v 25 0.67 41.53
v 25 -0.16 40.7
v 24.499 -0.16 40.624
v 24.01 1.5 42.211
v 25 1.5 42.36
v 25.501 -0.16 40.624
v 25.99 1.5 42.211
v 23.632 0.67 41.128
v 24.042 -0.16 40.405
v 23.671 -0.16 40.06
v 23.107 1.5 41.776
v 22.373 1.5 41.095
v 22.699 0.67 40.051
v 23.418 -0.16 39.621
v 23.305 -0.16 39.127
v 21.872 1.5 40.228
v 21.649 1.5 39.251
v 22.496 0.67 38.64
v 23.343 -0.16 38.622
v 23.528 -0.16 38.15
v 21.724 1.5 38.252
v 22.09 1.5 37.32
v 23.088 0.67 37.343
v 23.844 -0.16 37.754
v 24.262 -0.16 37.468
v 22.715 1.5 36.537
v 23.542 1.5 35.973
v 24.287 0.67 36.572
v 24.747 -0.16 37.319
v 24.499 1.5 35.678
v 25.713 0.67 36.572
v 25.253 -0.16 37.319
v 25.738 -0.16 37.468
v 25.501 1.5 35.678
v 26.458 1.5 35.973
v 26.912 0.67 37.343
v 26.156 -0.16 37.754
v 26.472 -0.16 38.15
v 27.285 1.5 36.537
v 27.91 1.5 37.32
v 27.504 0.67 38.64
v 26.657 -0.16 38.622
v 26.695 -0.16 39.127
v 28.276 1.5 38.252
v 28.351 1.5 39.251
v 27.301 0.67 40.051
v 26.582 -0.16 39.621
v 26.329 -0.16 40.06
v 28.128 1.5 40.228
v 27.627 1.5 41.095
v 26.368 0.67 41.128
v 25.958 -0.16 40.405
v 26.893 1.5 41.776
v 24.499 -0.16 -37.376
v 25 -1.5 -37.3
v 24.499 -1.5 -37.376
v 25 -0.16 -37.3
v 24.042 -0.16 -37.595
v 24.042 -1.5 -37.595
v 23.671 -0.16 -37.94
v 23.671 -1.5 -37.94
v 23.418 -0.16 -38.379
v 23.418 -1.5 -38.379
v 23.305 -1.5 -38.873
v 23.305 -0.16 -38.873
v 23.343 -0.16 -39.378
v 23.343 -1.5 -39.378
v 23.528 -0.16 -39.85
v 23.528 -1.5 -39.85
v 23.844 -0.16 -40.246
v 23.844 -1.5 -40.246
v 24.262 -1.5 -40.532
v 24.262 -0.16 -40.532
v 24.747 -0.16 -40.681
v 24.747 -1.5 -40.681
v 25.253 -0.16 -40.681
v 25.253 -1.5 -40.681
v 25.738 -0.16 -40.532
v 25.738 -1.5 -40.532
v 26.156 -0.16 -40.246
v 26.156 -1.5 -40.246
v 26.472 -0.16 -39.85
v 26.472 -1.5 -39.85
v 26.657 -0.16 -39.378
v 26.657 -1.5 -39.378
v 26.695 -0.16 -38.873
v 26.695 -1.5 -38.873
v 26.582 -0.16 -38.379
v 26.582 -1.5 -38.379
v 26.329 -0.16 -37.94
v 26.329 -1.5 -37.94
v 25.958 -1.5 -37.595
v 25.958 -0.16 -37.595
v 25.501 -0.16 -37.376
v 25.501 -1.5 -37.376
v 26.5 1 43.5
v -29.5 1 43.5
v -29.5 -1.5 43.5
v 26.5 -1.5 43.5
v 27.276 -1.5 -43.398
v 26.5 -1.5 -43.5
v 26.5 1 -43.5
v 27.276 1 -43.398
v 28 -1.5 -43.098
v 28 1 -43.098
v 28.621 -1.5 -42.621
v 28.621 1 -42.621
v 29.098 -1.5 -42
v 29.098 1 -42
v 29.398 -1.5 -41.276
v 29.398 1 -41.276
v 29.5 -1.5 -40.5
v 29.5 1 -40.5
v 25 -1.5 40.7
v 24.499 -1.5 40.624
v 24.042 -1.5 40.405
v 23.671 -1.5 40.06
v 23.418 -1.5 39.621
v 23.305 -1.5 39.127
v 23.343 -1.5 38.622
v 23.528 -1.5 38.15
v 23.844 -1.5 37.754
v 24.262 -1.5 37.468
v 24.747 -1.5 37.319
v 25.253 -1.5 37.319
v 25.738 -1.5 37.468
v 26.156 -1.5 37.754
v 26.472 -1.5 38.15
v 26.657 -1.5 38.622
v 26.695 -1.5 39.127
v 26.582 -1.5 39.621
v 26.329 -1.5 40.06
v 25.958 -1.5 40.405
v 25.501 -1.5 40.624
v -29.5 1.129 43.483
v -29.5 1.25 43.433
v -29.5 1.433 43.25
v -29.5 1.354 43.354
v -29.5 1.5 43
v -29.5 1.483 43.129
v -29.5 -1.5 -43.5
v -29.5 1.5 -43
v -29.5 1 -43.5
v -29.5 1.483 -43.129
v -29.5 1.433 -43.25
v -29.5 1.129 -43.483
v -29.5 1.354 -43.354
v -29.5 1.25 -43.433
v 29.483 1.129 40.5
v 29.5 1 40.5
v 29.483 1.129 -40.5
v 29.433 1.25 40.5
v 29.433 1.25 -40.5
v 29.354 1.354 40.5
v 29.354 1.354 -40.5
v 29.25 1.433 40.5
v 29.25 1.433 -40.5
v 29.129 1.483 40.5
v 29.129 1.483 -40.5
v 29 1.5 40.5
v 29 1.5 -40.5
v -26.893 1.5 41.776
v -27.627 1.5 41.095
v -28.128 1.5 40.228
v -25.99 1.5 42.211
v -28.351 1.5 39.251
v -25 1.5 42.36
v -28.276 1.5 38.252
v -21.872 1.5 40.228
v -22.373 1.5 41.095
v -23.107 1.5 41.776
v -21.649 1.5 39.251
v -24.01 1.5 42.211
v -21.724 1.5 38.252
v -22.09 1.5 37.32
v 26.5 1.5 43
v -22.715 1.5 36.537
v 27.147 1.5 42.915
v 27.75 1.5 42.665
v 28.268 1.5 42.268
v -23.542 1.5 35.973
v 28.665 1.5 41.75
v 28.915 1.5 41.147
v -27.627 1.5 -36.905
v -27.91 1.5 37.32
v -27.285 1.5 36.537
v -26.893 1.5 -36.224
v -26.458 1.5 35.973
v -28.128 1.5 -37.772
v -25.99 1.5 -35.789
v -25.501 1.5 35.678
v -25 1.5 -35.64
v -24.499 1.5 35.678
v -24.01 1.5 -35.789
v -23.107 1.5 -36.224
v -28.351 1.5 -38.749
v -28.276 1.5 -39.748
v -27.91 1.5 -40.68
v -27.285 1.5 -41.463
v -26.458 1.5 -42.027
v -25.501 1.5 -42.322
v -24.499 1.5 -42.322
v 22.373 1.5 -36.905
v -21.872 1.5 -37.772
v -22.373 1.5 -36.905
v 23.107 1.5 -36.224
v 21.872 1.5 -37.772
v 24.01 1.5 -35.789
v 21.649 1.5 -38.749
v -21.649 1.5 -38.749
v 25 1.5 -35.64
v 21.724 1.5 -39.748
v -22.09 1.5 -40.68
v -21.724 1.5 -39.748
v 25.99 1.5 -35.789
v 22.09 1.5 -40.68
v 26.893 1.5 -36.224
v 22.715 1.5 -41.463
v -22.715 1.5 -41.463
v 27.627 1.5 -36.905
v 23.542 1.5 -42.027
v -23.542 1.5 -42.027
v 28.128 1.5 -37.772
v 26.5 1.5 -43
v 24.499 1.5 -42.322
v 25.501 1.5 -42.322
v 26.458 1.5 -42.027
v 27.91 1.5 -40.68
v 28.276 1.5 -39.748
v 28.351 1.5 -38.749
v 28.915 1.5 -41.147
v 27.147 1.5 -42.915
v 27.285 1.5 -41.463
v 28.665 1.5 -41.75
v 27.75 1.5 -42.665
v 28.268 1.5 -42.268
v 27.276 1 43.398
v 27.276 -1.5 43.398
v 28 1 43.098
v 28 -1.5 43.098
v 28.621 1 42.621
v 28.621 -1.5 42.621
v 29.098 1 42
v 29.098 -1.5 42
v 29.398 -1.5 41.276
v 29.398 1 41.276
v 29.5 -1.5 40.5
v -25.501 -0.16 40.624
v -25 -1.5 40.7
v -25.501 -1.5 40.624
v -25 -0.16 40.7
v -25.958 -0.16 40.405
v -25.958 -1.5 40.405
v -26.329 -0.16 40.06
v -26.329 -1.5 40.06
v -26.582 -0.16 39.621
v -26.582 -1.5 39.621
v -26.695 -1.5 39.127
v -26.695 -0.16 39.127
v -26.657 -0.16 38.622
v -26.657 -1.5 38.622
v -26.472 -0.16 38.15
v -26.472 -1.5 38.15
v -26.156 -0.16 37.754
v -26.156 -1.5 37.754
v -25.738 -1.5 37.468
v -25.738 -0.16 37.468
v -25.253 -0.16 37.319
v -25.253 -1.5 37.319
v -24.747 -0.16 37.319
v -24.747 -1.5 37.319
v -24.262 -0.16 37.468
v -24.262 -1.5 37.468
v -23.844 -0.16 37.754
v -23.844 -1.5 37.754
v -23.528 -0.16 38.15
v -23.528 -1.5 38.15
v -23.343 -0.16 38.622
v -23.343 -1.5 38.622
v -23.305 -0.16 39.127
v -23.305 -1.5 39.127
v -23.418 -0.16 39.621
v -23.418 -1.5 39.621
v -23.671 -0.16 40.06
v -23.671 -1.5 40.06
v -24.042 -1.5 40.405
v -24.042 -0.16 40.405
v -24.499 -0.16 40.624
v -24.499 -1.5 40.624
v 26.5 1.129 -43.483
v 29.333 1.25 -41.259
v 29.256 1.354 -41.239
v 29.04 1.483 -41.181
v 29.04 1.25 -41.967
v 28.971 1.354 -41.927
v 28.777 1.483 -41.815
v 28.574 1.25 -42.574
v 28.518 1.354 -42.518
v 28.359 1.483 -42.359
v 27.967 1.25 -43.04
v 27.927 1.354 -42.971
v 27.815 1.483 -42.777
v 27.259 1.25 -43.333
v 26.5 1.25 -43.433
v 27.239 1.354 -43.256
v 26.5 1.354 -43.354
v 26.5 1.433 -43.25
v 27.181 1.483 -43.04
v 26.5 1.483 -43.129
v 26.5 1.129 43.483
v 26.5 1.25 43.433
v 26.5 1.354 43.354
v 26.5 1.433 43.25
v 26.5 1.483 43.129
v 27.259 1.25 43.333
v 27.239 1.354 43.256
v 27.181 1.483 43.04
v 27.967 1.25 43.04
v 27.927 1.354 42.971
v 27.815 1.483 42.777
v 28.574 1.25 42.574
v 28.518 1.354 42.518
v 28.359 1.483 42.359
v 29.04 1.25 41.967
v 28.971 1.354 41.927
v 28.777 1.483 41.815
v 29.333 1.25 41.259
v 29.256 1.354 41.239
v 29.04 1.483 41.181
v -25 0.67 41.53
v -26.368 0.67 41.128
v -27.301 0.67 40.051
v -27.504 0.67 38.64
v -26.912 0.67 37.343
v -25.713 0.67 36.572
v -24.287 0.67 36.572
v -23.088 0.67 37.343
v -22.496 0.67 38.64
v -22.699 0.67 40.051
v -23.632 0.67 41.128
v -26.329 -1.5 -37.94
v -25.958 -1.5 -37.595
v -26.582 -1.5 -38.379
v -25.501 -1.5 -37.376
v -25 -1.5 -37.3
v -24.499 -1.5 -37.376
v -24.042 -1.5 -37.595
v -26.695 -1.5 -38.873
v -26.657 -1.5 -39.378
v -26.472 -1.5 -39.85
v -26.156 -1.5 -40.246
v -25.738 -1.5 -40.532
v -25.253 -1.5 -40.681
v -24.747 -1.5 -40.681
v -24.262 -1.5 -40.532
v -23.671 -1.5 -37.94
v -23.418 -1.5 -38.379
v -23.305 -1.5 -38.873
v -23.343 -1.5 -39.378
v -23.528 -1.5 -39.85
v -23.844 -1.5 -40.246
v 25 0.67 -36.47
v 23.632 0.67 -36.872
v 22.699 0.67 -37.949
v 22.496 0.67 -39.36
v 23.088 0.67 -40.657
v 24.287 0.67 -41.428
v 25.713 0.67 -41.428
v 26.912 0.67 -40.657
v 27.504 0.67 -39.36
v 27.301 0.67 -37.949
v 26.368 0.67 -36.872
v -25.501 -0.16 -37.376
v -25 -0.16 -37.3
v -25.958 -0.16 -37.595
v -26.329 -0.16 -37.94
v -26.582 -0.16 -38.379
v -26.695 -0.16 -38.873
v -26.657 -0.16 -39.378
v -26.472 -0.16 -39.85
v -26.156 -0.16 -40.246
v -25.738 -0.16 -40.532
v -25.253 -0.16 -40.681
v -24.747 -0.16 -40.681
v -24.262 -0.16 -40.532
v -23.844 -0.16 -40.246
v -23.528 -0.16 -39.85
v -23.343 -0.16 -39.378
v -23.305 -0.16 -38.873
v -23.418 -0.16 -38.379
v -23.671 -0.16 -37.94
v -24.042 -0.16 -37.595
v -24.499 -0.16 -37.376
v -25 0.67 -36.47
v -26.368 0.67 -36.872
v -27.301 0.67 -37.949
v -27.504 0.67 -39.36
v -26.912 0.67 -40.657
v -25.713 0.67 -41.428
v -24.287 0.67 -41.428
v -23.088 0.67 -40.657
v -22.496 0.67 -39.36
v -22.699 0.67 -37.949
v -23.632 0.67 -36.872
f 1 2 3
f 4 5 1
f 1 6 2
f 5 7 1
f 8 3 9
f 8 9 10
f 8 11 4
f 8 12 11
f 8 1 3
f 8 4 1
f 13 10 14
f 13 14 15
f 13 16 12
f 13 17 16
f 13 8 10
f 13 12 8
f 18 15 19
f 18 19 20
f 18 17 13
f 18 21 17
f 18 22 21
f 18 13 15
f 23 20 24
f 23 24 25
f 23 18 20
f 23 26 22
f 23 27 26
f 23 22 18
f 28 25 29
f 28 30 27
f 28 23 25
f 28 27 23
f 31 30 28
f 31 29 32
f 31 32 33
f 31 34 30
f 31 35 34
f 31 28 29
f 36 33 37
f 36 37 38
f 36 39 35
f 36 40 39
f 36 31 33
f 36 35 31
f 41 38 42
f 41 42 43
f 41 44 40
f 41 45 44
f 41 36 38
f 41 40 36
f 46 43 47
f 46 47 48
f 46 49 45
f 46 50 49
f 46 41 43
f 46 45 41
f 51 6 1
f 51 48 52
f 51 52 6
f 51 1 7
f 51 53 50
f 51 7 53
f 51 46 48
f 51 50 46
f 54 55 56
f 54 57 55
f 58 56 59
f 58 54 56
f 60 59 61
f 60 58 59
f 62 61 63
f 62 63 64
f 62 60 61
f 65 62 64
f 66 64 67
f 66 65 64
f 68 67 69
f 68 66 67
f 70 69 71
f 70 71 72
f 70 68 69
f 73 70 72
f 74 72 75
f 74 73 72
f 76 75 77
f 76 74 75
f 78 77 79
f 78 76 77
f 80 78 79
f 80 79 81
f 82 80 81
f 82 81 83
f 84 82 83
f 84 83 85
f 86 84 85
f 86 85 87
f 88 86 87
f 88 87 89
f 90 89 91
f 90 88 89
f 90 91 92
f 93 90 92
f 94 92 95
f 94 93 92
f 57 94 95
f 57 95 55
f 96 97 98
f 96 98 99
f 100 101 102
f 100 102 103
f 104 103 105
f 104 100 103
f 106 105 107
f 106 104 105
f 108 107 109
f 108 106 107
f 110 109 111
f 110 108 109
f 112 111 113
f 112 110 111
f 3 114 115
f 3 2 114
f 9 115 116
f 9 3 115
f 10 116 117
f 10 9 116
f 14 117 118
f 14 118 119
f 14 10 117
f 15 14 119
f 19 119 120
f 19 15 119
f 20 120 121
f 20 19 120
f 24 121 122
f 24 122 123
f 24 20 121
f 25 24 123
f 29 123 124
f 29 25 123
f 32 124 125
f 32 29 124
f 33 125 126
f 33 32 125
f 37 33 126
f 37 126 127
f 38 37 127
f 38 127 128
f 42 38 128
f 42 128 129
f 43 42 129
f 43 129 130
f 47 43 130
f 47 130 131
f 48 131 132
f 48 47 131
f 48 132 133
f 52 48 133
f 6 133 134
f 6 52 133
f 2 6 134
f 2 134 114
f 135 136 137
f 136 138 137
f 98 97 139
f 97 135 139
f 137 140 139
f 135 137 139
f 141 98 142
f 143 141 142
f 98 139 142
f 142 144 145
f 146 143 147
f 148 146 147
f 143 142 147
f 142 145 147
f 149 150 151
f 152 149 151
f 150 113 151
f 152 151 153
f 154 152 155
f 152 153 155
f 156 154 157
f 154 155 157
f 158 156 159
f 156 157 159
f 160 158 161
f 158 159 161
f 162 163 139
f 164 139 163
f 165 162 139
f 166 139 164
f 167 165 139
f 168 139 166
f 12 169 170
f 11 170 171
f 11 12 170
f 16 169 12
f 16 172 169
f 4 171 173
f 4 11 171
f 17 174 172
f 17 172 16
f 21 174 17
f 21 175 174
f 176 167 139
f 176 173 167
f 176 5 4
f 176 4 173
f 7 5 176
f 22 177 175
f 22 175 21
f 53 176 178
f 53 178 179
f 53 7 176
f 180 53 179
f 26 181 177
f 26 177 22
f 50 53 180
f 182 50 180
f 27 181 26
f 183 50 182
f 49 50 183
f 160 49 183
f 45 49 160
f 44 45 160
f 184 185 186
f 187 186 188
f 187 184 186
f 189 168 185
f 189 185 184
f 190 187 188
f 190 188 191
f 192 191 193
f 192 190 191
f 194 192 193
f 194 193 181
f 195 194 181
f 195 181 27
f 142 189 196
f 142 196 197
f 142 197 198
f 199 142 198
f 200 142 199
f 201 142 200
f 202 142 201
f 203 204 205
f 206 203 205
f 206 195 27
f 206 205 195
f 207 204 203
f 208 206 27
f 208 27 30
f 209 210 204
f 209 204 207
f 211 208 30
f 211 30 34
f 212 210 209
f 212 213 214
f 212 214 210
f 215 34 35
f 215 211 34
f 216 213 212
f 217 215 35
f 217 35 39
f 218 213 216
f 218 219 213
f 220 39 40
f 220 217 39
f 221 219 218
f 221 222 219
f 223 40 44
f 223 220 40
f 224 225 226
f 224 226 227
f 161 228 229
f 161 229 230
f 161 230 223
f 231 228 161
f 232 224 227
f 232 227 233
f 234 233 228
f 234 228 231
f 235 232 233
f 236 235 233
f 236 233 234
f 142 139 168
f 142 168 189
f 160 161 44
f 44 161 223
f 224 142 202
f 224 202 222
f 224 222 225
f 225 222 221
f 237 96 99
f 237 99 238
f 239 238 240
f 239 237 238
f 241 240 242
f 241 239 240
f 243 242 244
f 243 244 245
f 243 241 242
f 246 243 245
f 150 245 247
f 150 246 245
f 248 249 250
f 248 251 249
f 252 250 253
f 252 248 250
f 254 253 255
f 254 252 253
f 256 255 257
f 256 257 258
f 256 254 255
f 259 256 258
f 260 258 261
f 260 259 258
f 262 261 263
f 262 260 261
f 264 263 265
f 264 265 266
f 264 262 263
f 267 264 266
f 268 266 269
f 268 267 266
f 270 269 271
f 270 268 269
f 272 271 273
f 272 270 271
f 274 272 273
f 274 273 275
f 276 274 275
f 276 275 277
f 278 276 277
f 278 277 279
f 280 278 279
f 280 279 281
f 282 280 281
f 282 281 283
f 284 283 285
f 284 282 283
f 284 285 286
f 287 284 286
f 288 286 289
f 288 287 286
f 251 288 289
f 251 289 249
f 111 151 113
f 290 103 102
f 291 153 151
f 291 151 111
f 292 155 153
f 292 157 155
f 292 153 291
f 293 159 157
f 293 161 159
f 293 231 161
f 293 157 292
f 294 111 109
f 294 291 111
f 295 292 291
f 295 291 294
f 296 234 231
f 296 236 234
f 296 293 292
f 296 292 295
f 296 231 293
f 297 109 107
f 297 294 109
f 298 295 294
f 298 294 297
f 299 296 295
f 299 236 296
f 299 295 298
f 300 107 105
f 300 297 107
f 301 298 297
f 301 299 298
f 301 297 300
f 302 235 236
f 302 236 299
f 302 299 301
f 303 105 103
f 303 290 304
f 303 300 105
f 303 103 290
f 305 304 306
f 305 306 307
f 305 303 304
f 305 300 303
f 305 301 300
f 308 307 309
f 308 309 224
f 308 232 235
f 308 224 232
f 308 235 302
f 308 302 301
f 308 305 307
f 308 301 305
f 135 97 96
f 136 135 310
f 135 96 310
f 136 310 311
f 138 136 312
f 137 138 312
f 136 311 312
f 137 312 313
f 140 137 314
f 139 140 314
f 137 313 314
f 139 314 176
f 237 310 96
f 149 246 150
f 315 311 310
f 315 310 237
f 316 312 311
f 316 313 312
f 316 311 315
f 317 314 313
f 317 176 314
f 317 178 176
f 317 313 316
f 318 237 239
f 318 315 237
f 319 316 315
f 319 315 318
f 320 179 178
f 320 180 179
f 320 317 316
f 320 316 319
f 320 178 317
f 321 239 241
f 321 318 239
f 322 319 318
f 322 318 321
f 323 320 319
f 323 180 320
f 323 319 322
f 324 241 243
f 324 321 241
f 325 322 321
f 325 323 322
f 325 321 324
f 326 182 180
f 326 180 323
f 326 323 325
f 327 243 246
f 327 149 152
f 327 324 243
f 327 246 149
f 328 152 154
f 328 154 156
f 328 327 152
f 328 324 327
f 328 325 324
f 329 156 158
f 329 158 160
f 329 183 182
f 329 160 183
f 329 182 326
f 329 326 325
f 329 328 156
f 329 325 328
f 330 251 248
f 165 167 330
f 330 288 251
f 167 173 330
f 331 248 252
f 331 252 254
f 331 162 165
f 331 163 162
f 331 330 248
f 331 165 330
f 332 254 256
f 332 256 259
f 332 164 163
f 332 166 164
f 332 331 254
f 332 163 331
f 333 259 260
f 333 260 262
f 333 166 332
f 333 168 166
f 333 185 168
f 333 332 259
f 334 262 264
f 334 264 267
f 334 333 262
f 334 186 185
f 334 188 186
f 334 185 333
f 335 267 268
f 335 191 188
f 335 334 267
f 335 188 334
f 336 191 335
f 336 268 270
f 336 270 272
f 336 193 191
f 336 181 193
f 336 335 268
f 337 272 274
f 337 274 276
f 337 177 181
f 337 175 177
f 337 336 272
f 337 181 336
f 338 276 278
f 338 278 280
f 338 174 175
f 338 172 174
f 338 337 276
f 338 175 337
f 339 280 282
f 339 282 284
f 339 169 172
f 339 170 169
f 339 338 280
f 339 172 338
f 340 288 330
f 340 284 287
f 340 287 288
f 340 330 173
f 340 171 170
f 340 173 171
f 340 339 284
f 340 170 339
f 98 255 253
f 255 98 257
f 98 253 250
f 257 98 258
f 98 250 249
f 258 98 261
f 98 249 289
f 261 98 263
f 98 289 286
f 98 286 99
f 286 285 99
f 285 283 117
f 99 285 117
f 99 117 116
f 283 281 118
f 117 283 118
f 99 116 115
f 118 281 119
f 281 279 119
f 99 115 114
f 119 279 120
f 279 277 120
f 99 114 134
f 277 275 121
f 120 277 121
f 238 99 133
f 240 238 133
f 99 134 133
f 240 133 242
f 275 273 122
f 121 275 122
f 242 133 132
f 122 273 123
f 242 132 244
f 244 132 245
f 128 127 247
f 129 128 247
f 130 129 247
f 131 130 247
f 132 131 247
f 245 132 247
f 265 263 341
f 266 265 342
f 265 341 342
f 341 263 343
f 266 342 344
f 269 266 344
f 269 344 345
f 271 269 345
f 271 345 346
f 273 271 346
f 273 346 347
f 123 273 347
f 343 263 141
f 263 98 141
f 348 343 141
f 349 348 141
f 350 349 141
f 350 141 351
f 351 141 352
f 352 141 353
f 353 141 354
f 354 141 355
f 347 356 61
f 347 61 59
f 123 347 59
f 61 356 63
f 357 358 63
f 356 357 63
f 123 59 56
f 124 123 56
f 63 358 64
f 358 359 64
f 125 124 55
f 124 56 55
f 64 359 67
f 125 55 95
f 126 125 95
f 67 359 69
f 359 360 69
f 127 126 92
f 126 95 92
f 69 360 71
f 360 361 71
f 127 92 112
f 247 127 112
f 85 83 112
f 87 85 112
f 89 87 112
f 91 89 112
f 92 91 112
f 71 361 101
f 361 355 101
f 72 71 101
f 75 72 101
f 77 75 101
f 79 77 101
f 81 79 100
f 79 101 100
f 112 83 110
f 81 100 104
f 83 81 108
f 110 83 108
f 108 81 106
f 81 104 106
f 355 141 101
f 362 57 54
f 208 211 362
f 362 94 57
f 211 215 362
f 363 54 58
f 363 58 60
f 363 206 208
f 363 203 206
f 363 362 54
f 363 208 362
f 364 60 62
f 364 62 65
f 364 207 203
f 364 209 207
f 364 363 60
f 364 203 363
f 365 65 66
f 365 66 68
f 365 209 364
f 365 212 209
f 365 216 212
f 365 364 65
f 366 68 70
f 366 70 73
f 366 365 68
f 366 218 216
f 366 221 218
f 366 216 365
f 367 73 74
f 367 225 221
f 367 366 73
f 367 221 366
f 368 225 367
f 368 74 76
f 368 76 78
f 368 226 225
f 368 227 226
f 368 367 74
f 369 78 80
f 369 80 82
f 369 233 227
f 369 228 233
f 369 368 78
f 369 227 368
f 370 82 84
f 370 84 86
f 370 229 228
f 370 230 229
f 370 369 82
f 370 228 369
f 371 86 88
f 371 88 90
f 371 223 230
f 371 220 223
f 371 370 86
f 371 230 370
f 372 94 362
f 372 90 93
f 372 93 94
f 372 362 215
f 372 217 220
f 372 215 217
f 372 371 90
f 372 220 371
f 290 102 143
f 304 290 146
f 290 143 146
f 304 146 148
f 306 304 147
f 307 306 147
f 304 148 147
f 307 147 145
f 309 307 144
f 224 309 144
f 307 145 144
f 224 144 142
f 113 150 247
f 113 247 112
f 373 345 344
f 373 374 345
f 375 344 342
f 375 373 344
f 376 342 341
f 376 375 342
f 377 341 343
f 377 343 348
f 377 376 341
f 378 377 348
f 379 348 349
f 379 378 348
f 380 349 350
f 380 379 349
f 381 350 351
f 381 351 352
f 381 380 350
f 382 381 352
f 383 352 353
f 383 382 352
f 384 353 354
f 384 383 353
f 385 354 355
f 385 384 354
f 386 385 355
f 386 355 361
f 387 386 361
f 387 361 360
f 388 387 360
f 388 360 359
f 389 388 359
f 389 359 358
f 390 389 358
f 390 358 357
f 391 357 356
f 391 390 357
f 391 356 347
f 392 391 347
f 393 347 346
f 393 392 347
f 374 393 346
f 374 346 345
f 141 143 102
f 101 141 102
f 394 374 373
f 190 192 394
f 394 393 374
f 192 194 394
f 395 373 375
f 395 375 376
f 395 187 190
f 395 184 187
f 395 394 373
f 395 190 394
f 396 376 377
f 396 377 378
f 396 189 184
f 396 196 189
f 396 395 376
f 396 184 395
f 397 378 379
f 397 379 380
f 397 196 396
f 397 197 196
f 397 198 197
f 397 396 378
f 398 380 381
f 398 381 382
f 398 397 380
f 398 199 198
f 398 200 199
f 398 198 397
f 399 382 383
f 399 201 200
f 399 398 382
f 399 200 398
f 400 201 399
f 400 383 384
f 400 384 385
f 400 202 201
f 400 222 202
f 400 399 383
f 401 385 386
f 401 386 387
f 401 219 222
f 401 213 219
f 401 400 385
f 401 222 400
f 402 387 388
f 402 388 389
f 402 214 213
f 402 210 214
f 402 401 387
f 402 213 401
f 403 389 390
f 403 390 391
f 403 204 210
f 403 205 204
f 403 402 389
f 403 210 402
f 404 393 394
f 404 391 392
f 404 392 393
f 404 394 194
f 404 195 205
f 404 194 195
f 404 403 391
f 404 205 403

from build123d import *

# Parameters (mm, degrees)
SKETCH1_W                    = 59
SKETCH1_H                    = 87
BOSS_EXTRUDE1_DEPTH          = 1.5
CSK_FOR_M3_SFHCS1_AT_2_COUNT = 2
CSK_FOR_M3_SFHCS1_AT_2_PITCH = 78
CSK_FOR_M3_SFHCS1_AT_3_COUNT = 2
CSK_FOR_M3_SFHCS1_AT_3_PITCH = 92.649878575
CSK_FOR_M3_SFHCS1_AT_4_COUNT = 2
CSK_FOR_M3_SFHCS1_AT_4_PITCH = 50
FILLET3_R                    = 3
FILLET4_R                    = 0.5


with BuildPart() as part:
    # Sketch1 → Boss-Extrude1 (new, symmetric)
    with BuildSketch(Plane(origin=(0, 0, 0), x_dir=(1, 0, 0), z_dir=(0, 1, 0))):
        Rectangle(SKETCH1_W, SKETCH1_H)
    extrude(amount=BOSS_EXTRUDE1_DEPTH, both=True)

    # Sketch4 → CSK for M3 SFHCS1 (revolve, cut)
    with BuildSketch(Plane(origin=(-25, 1.5, -39), x_dir=(0, 0, 1), z_dir=(1, 0, 0))):
        Polygon((0, 0), (0, 3), (1.7, 3), (1.7, 1.66), (3.36, 0), align=None)
    csk_for_m3_sfhcs1 = revolve(axis=Axis((-25, 7.85, -39), (0, -1, 0)), mode=Mode.SUBTRACT)

    # CSK for M3 SFHCS1 at 2: CSK for M3 SFHCS1 ×2
    with Locations(*[(0, 0, i * CSK_FOR_M3_SFHCS1_AT_2_PITCH) for i in range(1, CSK_FOR_M3_SFHCS1_AT_2_COUNT)]):
        add(csk_for_m3_sfhcs1, mode=Mode.SUBTRACT)

    # CSK for M3 SFHCS1 at 3: CSK for M3 SFHCS1 ×2
    with Locations(*[Vector(0.5396661147204319, 0, 0.8418791389638739) * (i * CSK_FOR_M3_SFHCS1_AT_3_PITCH) for i in range(1, CSK_FOR_M3_SFHCS1_AT_3_COUNT)]):
        add(csk_for_m3_sfhcs1, mode=Mode.SUBTRACT)

    # CSK for M3 SFHCS1 at 4: CSK for M3 SFHCS1 ×2
    with Locations(*[(i * CSK_FOR_M3_SFHCS1_AT_4_PITCH, 0, 0) for i in range(1, CSK_FOR_M3_SFHCS1_AT_4_COUNT)]):
        add(csk_for_m3_sfhcs1, mode=Mode.SUBTRACT)

    # Fillet3
    fillet3_edges = [part.edges().sort_by_distance(p)[0] for p in [
        (29.5, 0, 43.5),
        (29.5, 0, -43.5),
    ]]
    fillet(fillet3_edges, radius=FILLET3_R)

    # Fillet4
    fillet4_edges = [part.edges().sort_by_distance(p)[0] for p in [
        (-1.5, 1.5, 43.5),
        (-1.5, 1.5, -43.5),
        (29.5, 1.5, 0),
        (28.621320344, 1.5, 42.621320344),
        (28.621320344, 1.5, -42.621320344),
    ]]
    fillet(fillet4_edges, radius=FILLET4_R)


solid = part.part
